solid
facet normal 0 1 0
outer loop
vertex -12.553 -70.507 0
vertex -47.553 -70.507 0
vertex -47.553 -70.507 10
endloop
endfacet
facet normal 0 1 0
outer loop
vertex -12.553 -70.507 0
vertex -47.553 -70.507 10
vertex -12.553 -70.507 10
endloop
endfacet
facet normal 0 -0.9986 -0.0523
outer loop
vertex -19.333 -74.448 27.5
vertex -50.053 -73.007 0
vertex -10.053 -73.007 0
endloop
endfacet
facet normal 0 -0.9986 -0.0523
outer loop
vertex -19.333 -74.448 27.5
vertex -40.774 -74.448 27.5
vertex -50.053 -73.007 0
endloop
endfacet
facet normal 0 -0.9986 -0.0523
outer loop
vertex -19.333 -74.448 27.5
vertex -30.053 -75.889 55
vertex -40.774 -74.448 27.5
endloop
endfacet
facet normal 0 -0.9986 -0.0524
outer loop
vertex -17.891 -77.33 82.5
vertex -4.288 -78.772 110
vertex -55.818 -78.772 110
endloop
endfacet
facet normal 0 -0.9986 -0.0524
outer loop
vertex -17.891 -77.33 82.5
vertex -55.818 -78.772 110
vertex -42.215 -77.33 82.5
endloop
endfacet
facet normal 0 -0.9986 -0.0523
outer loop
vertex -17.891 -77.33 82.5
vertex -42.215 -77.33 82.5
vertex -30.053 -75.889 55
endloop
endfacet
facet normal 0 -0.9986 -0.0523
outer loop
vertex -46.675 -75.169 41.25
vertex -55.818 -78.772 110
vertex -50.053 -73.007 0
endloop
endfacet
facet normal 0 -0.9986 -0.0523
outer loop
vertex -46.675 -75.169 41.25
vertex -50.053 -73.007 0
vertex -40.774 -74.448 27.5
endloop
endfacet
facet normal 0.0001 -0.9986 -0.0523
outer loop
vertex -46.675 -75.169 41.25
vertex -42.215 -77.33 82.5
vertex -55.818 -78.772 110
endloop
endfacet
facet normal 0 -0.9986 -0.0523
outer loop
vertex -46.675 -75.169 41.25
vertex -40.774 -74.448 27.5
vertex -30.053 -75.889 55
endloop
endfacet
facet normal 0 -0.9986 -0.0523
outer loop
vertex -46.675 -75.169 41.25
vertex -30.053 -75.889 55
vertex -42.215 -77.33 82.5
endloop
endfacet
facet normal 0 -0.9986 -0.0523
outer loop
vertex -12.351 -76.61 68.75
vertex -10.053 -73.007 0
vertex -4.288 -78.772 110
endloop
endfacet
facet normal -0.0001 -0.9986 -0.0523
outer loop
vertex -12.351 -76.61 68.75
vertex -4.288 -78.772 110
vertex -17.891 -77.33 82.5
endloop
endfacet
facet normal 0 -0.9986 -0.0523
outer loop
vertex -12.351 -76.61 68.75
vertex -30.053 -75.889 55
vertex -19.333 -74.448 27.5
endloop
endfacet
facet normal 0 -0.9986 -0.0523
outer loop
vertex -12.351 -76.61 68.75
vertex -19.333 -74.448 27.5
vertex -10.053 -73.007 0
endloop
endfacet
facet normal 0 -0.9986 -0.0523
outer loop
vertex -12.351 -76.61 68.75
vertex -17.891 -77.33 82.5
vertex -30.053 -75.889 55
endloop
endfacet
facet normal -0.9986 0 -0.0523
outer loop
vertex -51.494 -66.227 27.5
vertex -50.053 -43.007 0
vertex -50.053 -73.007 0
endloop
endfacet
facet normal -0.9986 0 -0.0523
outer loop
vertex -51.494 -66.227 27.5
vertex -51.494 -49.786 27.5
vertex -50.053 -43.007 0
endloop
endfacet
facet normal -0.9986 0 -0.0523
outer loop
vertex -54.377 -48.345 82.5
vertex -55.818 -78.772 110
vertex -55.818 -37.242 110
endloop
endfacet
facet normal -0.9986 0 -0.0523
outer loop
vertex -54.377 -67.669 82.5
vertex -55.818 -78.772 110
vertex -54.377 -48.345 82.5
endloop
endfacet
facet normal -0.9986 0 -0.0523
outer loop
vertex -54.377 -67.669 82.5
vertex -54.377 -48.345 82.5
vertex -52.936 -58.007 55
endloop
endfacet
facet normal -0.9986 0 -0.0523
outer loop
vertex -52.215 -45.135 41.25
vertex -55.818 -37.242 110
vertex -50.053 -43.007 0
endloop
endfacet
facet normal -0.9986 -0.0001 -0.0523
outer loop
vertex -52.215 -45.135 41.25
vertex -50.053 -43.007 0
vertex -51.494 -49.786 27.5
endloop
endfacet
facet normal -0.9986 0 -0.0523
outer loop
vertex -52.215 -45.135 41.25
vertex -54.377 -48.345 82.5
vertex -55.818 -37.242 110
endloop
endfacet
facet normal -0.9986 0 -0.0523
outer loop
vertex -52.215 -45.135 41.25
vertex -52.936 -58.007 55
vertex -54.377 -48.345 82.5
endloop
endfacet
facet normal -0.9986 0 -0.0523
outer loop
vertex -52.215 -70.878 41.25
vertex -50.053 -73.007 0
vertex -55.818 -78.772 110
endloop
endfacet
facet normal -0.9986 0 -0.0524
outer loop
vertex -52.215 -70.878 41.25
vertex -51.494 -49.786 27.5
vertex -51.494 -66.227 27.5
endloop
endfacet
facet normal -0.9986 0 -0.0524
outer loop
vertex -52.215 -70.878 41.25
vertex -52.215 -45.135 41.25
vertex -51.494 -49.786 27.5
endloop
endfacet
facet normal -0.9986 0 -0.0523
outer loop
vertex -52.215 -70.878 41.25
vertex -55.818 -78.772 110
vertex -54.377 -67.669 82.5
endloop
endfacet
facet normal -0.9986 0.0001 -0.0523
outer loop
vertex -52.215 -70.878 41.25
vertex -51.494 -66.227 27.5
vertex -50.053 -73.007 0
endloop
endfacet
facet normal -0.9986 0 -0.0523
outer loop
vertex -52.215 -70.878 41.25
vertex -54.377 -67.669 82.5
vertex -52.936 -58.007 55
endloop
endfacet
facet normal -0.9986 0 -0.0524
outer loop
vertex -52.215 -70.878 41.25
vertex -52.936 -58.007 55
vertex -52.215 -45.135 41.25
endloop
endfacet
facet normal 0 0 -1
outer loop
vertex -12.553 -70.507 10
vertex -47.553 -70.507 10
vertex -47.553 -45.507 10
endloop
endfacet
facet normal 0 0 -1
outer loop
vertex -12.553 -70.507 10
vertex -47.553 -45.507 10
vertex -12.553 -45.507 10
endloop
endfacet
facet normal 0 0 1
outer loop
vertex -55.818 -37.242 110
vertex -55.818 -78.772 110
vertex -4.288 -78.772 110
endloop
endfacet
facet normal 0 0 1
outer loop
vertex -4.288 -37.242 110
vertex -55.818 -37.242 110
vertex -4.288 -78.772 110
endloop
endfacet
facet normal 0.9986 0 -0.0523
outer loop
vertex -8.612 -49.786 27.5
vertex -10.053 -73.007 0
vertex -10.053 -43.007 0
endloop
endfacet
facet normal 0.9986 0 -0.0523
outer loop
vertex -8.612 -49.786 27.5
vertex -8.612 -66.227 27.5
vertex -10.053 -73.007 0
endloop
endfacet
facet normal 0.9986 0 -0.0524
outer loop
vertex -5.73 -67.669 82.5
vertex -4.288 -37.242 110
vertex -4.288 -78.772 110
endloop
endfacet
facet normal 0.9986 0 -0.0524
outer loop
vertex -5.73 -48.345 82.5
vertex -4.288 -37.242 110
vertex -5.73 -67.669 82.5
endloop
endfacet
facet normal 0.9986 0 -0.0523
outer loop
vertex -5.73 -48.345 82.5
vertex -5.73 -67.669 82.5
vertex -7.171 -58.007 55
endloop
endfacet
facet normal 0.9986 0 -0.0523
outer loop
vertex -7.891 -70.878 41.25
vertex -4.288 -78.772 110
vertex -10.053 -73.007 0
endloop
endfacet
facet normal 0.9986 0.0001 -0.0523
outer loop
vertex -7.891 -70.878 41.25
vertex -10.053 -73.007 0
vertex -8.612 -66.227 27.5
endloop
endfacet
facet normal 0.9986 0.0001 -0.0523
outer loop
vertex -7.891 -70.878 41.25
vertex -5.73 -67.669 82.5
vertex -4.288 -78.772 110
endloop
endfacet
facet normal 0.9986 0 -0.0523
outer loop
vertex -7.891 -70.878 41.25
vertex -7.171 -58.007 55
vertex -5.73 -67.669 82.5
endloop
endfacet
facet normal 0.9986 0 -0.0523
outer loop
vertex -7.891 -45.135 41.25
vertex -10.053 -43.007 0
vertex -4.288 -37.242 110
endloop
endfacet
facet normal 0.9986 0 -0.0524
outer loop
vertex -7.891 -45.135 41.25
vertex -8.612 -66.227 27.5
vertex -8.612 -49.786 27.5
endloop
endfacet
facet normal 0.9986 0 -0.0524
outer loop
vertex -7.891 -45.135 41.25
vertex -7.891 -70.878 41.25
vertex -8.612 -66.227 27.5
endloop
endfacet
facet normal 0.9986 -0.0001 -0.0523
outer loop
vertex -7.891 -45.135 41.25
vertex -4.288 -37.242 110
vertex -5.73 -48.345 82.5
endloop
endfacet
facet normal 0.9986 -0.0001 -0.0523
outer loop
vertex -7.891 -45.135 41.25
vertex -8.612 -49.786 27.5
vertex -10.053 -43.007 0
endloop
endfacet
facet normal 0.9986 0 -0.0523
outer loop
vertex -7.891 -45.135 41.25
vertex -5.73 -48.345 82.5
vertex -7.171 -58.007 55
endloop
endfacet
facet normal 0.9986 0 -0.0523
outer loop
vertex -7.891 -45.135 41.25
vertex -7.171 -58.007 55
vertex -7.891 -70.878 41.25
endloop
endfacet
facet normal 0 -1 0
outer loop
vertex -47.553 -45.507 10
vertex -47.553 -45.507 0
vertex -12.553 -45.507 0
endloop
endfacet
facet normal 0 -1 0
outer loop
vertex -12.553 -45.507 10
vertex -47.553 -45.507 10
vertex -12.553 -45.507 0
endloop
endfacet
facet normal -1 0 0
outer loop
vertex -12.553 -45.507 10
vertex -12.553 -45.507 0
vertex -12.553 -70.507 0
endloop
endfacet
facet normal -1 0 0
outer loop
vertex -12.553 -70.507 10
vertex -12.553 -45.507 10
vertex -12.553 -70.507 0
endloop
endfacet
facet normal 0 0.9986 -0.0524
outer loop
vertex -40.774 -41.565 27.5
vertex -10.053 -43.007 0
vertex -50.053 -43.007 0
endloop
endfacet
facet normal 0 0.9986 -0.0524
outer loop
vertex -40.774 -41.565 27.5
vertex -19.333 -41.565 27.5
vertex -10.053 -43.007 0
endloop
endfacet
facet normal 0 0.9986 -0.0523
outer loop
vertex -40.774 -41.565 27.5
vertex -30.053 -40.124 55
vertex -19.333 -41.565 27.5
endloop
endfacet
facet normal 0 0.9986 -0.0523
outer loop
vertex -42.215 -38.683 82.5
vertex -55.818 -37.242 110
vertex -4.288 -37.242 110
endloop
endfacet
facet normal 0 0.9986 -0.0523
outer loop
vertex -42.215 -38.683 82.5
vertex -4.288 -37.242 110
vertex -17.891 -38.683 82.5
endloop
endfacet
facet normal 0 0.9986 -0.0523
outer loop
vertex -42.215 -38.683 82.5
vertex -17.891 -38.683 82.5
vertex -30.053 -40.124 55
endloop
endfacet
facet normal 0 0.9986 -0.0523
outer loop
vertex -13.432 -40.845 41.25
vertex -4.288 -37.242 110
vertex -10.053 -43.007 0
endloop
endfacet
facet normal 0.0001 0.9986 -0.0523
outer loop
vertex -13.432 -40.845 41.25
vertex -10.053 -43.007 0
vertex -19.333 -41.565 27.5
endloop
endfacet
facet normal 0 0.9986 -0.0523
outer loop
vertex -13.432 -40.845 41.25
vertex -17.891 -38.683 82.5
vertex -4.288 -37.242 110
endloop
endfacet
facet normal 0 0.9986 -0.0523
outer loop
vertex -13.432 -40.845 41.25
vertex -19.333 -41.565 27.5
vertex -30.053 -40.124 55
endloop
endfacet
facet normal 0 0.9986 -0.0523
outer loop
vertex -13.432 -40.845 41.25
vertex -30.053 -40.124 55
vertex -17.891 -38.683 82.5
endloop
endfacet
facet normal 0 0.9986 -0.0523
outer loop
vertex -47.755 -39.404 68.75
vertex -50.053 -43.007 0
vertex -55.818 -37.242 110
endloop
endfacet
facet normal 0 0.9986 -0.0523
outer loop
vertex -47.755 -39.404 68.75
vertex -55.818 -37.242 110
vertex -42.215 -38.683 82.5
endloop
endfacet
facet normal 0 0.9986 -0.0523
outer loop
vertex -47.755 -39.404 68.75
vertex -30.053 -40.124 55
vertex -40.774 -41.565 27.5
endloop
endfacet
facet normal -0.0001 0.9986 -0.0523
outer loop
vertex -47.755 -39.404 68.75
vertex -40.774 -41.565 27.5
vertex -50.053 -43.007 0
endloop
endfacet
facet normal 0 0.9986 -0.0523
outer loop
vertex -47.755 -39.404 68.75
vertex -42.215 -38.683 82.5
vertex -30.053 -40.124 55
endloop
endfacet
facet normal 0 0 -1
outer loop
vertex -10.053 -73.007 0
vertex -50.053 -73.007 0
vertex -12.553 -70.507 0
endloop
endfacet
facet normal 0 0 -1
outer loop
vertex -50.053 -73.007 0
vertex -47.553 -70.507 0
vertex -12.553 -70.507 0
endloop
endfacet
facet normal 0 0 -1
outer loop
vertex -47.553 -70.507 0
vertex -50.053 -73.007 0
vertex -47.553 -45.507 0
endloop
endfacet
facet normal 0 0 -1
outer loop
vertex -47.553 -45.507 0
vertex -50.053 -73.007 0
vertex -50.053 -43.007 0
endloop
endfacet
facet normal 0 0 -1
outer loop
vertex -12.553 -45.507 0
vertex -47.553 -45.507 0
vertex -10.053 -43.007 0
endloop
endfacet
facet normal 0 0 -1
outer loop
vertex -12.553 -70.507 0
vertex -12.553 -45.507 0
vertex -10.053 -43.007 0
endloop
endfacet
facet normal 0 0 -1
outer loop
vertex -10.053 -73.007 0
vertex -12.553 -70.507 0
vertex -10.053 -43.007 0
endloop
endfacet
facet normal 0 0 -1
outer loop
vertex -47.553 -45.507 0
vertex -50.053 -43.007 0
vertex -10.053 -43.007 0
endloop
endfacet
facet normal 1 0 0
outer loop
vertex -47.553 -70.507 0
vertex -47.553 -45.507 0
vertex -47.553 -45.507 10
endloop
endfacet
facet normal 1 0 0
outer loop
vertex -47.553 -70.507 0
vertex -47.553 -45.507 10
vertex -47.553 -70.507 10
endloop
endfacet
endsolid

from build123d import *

# Parameters (mm, degrees)
F0_W     = 40
F0_H     = 30
F1_DEPTH = 110
F1_TAPER = -3
F2_W     = 35
F2_H     = 25
F3_DEPTH = 10


with BuildPart() as f1:
    # F0 (on Top) → F1 (new body)
    with BuildSketch(Plane.XY):
        with Locations((-30.053210146, -58.0066898444)):
            Rectangle(F0_W, F0_H)
    extrude(amount=F1_DEPTH, taper=F1_TAPER)

    # F2 (on face) → F3 (cut)
    with BuildSketch(Plane(origin=(0, 0, 0), x_dir=(1, 0, 0), z_dir=(0, 0, -1))):
        with Locations((-30.053210146, 58.0066898444)):
            Rectangle(F2_W, F2_H)
    extrude(amount=-F3_DEPTH, mode=Mode.SUBTRACT)


solid = f1.part
